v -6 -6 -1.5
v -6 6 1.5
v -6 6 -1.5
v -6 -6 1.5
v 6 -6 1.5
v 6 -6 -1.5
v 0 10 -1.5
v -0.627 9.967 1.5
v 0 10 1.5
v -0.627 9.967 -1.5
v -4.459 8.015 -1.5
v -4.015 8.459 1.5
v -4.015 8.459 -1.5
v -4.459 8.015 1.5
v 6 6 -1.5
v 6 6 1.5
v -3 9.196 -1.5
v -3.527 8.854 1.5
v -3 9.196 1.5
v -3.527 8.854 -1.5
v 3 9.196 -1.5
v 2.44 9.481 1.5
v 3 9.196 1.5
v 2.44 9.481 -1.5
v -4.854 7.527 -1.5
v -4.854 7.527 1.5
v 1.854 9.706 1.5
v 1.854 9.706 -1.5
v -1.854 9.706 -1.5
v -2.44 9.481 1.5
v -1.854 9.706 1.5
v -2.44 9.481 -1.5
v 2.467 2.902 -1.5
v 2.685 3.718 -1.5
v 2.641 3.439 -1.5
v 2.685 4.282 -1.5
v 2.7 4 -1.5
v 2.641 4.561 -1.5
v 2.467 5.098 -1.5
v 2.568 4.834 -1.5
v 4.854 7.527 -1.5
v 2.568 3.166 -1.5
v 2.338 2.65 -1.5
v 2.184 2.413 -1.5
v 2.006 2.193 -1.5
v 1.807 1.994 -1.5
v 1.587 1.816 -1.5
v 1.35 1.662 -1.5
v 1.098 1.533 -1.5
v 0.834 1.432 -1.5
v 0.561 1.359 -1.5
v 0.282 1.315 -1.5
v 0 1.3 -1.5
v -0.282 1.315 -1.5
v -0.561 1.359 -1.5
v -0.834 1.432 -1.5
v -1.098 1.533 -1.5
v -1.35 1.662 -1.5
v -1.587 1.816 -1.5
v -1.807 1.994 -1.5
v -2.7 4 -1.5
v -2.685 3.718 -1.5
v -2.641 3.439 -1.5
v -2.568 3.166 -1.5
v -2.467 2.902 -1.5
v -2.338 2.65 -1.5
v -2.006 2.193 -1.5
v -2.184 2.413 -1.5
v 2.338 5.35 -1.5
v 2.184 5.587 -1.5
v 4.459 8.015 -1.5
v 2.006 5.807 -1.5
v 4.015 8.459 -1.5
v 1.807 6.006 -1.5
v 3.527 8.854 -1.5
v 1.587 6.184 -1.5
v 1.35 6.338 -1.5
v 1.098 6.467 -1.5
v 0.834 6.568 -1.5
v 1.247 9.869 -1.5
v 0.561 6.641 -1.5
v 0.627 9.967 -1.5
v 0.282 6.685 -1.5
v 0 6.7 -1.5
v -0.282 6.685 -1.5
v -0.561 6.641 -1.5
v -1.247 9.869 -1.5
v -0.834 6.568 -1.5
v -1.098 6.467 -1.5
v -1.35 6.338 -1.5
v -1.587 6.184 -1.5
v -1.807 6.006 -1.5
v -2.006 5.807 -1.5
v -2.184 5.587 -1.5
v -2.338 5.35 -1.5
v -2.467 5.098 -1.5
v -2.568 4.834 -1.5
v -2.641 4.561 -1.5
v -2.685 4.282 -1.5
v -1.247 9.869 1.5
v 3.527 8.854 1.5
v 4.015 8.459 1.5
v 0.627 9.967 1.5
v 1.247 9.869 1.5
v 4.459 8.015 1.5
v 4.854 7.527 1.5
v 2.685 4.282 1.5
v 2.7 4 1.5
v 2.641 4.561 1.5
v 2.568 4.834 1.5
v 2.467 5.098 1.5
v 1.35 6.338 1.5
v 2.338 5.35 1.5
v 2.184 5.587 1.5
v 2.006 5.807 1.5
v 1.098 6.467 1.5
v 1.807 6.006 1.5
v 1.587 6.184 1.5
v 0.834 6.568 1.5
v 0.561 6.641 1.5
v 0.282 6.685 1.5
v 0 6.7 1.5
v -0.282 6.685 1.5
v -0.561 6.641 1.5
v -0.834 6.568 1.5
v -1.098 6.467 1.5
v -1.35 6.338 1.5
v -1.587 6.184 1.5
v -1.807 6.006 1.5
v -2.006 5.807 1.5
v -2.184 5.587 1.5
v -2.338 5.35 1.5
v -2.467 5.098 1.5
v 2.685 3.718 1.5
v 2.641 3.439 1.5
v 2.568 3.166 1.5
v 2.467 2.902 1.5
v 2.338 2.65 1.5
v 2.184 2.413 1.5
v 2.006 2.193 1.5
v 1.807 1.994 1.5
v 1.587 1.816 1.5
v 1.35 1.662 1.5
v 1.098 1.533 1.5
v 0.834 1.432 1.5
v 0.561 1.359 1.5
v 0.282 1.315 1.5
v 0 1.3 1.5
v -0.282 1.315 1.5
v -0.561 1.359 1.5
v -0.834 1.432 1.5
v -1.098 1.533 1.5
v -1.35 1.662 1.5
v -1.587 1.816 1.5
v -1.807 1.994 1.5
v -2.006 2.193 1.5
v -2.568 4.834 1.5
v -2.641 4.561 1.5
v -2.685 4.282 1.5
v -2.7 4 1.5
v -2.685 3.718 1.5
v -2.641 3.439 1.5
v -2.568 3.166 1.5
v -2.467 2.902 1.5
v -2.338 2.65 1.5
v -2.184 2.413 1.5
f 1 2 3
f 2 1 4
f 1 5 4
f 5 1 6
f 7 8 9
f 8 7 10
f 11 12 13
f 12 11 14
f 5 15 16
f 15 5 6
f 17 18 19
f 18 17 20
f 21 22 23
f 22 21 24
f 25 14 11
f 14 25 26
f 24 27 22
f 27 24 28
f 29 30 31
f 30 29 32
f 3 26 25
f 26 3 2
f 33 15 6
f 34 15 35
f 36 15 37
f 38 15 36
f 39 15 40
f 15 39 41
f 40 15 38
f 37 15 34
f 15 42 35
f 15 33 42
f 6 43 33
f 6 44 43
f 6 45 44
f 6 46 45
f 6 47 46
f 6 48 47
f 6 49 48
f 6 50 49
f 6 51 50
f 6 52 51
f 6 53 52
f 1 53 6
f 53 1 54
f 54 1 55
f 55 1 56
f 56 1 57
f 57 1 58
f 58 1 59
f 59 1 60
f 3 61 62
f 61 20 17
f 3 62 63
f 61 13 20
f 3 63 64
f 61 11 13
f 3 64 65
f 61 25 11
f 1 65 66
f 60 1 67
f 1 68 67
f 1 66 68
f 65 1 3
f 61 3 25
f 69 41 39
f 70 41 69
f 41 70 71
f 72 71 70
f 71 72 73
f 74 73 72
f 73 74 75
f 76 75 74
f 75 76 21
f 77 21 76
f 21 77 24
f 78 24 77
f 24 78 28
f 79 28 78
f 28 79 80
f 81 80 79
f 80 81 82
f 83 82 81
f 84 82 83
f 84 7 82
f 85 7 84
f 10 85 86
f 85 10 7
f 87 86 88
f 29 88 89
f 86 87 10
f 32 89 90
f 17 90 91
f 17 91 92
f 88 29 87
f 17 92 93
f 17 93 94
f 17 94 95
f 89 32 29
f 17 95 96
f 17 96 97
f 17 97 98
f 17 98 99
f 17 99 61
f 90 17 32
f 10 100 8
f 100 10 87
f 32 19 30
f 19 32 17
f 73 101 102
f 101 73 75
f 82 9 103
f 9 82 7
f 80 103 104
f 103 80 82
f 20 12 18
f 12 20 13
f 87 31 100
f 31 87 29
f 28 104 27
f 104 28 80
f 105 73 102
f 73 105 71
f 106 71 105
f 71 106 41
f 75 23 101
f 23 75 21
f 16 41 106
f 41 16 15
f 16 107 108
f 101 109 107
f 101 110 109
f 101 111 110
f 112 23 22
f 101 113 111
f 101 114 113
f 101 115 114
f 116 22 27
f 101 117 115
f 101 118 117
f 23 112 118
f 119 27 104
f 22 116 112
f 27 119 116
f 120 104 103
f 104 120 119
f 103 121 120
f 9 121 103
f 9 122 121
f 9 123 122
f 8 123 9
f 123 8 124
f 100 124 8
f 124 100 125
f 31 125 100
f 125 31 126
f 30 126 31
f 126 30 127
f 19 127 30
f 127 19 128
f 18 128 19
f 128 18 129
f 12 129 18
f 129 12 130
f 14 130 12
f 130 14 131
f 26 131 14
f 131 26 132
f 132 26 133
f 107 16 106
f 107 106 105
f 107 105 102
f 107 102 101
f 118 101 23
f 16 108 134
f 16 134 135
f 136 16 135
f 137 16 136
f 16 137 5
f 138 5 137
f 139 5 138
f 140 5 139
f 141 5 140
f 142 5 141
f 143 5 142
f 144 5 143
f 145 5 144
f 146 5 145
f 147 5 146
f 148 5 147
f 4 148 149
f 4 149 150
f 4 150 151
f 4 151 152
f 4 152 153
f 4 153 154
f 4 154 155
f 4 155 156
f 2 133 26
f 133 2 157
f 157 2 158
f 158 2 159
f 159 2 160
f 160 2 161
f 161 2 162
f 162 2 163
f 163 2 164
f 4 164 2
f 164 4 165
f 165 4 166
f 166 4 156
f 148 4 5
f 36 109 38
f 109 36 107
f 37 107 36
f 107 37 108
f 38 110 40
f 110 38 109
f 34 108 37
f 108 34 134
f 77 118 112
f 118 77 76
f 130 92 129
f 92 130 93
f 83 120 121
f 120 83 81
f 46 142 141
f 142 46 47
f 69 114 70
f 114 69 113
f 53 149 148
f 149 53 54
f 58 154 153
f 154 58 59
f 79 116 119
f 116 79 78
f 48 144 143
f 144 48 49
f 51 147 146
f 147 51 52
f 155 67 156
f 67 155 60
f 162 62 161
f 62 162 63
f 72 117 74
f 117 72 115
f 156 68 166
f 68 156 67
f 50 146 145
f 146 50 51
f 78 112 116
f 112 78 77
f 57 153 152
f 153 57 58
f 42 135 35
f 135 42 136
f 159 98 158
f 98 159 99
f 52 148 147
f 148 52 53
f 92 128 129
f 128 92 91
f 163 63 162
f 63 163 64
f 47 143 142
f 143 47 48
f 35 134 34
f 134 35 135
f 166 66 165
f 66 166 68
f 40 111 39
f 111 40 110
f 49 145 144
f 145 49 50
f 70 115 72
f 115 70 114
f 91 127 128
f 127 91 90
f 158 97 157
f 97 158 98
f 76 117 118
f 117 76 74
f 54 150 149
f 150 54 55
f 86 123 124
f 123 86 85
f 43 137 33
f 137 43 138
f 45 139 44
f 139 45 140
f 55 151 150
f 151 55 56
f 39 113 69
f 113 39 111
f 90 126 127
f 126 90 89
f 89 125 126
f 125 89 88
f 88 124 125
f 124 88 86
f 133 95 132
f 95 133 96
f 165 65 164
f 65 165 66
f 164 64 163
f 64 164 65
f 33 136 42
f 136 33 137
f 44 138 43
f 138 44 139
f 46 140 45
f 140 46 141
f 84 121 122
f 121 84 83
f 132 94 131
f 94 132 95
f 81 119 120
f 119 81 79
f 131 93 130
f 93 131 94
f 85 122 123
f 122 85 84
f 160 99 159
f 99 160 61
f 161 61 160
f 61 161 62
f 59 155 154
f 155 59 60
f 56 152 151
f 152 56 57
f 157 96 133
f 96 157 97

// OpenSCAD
// Single-hole mounting tab.
$fn = 60;
eps = 0.02;
tab_w = 12;
tab_h = 20;
tab_t = 3;
difference() {
    hull() { translate([0,0,0]) cube([tab_w,tab_w,tab_t],center=true); translate([0,tab_h/2-tab_w/2,0]) cylinder(d=tab_w,h=tab_t,center=true); }
    translate([0,tab_h/2-tab_w/2,-tab_t/2-eps]) cylinder(d=5.4,h=tab_t+2*eps);
}
